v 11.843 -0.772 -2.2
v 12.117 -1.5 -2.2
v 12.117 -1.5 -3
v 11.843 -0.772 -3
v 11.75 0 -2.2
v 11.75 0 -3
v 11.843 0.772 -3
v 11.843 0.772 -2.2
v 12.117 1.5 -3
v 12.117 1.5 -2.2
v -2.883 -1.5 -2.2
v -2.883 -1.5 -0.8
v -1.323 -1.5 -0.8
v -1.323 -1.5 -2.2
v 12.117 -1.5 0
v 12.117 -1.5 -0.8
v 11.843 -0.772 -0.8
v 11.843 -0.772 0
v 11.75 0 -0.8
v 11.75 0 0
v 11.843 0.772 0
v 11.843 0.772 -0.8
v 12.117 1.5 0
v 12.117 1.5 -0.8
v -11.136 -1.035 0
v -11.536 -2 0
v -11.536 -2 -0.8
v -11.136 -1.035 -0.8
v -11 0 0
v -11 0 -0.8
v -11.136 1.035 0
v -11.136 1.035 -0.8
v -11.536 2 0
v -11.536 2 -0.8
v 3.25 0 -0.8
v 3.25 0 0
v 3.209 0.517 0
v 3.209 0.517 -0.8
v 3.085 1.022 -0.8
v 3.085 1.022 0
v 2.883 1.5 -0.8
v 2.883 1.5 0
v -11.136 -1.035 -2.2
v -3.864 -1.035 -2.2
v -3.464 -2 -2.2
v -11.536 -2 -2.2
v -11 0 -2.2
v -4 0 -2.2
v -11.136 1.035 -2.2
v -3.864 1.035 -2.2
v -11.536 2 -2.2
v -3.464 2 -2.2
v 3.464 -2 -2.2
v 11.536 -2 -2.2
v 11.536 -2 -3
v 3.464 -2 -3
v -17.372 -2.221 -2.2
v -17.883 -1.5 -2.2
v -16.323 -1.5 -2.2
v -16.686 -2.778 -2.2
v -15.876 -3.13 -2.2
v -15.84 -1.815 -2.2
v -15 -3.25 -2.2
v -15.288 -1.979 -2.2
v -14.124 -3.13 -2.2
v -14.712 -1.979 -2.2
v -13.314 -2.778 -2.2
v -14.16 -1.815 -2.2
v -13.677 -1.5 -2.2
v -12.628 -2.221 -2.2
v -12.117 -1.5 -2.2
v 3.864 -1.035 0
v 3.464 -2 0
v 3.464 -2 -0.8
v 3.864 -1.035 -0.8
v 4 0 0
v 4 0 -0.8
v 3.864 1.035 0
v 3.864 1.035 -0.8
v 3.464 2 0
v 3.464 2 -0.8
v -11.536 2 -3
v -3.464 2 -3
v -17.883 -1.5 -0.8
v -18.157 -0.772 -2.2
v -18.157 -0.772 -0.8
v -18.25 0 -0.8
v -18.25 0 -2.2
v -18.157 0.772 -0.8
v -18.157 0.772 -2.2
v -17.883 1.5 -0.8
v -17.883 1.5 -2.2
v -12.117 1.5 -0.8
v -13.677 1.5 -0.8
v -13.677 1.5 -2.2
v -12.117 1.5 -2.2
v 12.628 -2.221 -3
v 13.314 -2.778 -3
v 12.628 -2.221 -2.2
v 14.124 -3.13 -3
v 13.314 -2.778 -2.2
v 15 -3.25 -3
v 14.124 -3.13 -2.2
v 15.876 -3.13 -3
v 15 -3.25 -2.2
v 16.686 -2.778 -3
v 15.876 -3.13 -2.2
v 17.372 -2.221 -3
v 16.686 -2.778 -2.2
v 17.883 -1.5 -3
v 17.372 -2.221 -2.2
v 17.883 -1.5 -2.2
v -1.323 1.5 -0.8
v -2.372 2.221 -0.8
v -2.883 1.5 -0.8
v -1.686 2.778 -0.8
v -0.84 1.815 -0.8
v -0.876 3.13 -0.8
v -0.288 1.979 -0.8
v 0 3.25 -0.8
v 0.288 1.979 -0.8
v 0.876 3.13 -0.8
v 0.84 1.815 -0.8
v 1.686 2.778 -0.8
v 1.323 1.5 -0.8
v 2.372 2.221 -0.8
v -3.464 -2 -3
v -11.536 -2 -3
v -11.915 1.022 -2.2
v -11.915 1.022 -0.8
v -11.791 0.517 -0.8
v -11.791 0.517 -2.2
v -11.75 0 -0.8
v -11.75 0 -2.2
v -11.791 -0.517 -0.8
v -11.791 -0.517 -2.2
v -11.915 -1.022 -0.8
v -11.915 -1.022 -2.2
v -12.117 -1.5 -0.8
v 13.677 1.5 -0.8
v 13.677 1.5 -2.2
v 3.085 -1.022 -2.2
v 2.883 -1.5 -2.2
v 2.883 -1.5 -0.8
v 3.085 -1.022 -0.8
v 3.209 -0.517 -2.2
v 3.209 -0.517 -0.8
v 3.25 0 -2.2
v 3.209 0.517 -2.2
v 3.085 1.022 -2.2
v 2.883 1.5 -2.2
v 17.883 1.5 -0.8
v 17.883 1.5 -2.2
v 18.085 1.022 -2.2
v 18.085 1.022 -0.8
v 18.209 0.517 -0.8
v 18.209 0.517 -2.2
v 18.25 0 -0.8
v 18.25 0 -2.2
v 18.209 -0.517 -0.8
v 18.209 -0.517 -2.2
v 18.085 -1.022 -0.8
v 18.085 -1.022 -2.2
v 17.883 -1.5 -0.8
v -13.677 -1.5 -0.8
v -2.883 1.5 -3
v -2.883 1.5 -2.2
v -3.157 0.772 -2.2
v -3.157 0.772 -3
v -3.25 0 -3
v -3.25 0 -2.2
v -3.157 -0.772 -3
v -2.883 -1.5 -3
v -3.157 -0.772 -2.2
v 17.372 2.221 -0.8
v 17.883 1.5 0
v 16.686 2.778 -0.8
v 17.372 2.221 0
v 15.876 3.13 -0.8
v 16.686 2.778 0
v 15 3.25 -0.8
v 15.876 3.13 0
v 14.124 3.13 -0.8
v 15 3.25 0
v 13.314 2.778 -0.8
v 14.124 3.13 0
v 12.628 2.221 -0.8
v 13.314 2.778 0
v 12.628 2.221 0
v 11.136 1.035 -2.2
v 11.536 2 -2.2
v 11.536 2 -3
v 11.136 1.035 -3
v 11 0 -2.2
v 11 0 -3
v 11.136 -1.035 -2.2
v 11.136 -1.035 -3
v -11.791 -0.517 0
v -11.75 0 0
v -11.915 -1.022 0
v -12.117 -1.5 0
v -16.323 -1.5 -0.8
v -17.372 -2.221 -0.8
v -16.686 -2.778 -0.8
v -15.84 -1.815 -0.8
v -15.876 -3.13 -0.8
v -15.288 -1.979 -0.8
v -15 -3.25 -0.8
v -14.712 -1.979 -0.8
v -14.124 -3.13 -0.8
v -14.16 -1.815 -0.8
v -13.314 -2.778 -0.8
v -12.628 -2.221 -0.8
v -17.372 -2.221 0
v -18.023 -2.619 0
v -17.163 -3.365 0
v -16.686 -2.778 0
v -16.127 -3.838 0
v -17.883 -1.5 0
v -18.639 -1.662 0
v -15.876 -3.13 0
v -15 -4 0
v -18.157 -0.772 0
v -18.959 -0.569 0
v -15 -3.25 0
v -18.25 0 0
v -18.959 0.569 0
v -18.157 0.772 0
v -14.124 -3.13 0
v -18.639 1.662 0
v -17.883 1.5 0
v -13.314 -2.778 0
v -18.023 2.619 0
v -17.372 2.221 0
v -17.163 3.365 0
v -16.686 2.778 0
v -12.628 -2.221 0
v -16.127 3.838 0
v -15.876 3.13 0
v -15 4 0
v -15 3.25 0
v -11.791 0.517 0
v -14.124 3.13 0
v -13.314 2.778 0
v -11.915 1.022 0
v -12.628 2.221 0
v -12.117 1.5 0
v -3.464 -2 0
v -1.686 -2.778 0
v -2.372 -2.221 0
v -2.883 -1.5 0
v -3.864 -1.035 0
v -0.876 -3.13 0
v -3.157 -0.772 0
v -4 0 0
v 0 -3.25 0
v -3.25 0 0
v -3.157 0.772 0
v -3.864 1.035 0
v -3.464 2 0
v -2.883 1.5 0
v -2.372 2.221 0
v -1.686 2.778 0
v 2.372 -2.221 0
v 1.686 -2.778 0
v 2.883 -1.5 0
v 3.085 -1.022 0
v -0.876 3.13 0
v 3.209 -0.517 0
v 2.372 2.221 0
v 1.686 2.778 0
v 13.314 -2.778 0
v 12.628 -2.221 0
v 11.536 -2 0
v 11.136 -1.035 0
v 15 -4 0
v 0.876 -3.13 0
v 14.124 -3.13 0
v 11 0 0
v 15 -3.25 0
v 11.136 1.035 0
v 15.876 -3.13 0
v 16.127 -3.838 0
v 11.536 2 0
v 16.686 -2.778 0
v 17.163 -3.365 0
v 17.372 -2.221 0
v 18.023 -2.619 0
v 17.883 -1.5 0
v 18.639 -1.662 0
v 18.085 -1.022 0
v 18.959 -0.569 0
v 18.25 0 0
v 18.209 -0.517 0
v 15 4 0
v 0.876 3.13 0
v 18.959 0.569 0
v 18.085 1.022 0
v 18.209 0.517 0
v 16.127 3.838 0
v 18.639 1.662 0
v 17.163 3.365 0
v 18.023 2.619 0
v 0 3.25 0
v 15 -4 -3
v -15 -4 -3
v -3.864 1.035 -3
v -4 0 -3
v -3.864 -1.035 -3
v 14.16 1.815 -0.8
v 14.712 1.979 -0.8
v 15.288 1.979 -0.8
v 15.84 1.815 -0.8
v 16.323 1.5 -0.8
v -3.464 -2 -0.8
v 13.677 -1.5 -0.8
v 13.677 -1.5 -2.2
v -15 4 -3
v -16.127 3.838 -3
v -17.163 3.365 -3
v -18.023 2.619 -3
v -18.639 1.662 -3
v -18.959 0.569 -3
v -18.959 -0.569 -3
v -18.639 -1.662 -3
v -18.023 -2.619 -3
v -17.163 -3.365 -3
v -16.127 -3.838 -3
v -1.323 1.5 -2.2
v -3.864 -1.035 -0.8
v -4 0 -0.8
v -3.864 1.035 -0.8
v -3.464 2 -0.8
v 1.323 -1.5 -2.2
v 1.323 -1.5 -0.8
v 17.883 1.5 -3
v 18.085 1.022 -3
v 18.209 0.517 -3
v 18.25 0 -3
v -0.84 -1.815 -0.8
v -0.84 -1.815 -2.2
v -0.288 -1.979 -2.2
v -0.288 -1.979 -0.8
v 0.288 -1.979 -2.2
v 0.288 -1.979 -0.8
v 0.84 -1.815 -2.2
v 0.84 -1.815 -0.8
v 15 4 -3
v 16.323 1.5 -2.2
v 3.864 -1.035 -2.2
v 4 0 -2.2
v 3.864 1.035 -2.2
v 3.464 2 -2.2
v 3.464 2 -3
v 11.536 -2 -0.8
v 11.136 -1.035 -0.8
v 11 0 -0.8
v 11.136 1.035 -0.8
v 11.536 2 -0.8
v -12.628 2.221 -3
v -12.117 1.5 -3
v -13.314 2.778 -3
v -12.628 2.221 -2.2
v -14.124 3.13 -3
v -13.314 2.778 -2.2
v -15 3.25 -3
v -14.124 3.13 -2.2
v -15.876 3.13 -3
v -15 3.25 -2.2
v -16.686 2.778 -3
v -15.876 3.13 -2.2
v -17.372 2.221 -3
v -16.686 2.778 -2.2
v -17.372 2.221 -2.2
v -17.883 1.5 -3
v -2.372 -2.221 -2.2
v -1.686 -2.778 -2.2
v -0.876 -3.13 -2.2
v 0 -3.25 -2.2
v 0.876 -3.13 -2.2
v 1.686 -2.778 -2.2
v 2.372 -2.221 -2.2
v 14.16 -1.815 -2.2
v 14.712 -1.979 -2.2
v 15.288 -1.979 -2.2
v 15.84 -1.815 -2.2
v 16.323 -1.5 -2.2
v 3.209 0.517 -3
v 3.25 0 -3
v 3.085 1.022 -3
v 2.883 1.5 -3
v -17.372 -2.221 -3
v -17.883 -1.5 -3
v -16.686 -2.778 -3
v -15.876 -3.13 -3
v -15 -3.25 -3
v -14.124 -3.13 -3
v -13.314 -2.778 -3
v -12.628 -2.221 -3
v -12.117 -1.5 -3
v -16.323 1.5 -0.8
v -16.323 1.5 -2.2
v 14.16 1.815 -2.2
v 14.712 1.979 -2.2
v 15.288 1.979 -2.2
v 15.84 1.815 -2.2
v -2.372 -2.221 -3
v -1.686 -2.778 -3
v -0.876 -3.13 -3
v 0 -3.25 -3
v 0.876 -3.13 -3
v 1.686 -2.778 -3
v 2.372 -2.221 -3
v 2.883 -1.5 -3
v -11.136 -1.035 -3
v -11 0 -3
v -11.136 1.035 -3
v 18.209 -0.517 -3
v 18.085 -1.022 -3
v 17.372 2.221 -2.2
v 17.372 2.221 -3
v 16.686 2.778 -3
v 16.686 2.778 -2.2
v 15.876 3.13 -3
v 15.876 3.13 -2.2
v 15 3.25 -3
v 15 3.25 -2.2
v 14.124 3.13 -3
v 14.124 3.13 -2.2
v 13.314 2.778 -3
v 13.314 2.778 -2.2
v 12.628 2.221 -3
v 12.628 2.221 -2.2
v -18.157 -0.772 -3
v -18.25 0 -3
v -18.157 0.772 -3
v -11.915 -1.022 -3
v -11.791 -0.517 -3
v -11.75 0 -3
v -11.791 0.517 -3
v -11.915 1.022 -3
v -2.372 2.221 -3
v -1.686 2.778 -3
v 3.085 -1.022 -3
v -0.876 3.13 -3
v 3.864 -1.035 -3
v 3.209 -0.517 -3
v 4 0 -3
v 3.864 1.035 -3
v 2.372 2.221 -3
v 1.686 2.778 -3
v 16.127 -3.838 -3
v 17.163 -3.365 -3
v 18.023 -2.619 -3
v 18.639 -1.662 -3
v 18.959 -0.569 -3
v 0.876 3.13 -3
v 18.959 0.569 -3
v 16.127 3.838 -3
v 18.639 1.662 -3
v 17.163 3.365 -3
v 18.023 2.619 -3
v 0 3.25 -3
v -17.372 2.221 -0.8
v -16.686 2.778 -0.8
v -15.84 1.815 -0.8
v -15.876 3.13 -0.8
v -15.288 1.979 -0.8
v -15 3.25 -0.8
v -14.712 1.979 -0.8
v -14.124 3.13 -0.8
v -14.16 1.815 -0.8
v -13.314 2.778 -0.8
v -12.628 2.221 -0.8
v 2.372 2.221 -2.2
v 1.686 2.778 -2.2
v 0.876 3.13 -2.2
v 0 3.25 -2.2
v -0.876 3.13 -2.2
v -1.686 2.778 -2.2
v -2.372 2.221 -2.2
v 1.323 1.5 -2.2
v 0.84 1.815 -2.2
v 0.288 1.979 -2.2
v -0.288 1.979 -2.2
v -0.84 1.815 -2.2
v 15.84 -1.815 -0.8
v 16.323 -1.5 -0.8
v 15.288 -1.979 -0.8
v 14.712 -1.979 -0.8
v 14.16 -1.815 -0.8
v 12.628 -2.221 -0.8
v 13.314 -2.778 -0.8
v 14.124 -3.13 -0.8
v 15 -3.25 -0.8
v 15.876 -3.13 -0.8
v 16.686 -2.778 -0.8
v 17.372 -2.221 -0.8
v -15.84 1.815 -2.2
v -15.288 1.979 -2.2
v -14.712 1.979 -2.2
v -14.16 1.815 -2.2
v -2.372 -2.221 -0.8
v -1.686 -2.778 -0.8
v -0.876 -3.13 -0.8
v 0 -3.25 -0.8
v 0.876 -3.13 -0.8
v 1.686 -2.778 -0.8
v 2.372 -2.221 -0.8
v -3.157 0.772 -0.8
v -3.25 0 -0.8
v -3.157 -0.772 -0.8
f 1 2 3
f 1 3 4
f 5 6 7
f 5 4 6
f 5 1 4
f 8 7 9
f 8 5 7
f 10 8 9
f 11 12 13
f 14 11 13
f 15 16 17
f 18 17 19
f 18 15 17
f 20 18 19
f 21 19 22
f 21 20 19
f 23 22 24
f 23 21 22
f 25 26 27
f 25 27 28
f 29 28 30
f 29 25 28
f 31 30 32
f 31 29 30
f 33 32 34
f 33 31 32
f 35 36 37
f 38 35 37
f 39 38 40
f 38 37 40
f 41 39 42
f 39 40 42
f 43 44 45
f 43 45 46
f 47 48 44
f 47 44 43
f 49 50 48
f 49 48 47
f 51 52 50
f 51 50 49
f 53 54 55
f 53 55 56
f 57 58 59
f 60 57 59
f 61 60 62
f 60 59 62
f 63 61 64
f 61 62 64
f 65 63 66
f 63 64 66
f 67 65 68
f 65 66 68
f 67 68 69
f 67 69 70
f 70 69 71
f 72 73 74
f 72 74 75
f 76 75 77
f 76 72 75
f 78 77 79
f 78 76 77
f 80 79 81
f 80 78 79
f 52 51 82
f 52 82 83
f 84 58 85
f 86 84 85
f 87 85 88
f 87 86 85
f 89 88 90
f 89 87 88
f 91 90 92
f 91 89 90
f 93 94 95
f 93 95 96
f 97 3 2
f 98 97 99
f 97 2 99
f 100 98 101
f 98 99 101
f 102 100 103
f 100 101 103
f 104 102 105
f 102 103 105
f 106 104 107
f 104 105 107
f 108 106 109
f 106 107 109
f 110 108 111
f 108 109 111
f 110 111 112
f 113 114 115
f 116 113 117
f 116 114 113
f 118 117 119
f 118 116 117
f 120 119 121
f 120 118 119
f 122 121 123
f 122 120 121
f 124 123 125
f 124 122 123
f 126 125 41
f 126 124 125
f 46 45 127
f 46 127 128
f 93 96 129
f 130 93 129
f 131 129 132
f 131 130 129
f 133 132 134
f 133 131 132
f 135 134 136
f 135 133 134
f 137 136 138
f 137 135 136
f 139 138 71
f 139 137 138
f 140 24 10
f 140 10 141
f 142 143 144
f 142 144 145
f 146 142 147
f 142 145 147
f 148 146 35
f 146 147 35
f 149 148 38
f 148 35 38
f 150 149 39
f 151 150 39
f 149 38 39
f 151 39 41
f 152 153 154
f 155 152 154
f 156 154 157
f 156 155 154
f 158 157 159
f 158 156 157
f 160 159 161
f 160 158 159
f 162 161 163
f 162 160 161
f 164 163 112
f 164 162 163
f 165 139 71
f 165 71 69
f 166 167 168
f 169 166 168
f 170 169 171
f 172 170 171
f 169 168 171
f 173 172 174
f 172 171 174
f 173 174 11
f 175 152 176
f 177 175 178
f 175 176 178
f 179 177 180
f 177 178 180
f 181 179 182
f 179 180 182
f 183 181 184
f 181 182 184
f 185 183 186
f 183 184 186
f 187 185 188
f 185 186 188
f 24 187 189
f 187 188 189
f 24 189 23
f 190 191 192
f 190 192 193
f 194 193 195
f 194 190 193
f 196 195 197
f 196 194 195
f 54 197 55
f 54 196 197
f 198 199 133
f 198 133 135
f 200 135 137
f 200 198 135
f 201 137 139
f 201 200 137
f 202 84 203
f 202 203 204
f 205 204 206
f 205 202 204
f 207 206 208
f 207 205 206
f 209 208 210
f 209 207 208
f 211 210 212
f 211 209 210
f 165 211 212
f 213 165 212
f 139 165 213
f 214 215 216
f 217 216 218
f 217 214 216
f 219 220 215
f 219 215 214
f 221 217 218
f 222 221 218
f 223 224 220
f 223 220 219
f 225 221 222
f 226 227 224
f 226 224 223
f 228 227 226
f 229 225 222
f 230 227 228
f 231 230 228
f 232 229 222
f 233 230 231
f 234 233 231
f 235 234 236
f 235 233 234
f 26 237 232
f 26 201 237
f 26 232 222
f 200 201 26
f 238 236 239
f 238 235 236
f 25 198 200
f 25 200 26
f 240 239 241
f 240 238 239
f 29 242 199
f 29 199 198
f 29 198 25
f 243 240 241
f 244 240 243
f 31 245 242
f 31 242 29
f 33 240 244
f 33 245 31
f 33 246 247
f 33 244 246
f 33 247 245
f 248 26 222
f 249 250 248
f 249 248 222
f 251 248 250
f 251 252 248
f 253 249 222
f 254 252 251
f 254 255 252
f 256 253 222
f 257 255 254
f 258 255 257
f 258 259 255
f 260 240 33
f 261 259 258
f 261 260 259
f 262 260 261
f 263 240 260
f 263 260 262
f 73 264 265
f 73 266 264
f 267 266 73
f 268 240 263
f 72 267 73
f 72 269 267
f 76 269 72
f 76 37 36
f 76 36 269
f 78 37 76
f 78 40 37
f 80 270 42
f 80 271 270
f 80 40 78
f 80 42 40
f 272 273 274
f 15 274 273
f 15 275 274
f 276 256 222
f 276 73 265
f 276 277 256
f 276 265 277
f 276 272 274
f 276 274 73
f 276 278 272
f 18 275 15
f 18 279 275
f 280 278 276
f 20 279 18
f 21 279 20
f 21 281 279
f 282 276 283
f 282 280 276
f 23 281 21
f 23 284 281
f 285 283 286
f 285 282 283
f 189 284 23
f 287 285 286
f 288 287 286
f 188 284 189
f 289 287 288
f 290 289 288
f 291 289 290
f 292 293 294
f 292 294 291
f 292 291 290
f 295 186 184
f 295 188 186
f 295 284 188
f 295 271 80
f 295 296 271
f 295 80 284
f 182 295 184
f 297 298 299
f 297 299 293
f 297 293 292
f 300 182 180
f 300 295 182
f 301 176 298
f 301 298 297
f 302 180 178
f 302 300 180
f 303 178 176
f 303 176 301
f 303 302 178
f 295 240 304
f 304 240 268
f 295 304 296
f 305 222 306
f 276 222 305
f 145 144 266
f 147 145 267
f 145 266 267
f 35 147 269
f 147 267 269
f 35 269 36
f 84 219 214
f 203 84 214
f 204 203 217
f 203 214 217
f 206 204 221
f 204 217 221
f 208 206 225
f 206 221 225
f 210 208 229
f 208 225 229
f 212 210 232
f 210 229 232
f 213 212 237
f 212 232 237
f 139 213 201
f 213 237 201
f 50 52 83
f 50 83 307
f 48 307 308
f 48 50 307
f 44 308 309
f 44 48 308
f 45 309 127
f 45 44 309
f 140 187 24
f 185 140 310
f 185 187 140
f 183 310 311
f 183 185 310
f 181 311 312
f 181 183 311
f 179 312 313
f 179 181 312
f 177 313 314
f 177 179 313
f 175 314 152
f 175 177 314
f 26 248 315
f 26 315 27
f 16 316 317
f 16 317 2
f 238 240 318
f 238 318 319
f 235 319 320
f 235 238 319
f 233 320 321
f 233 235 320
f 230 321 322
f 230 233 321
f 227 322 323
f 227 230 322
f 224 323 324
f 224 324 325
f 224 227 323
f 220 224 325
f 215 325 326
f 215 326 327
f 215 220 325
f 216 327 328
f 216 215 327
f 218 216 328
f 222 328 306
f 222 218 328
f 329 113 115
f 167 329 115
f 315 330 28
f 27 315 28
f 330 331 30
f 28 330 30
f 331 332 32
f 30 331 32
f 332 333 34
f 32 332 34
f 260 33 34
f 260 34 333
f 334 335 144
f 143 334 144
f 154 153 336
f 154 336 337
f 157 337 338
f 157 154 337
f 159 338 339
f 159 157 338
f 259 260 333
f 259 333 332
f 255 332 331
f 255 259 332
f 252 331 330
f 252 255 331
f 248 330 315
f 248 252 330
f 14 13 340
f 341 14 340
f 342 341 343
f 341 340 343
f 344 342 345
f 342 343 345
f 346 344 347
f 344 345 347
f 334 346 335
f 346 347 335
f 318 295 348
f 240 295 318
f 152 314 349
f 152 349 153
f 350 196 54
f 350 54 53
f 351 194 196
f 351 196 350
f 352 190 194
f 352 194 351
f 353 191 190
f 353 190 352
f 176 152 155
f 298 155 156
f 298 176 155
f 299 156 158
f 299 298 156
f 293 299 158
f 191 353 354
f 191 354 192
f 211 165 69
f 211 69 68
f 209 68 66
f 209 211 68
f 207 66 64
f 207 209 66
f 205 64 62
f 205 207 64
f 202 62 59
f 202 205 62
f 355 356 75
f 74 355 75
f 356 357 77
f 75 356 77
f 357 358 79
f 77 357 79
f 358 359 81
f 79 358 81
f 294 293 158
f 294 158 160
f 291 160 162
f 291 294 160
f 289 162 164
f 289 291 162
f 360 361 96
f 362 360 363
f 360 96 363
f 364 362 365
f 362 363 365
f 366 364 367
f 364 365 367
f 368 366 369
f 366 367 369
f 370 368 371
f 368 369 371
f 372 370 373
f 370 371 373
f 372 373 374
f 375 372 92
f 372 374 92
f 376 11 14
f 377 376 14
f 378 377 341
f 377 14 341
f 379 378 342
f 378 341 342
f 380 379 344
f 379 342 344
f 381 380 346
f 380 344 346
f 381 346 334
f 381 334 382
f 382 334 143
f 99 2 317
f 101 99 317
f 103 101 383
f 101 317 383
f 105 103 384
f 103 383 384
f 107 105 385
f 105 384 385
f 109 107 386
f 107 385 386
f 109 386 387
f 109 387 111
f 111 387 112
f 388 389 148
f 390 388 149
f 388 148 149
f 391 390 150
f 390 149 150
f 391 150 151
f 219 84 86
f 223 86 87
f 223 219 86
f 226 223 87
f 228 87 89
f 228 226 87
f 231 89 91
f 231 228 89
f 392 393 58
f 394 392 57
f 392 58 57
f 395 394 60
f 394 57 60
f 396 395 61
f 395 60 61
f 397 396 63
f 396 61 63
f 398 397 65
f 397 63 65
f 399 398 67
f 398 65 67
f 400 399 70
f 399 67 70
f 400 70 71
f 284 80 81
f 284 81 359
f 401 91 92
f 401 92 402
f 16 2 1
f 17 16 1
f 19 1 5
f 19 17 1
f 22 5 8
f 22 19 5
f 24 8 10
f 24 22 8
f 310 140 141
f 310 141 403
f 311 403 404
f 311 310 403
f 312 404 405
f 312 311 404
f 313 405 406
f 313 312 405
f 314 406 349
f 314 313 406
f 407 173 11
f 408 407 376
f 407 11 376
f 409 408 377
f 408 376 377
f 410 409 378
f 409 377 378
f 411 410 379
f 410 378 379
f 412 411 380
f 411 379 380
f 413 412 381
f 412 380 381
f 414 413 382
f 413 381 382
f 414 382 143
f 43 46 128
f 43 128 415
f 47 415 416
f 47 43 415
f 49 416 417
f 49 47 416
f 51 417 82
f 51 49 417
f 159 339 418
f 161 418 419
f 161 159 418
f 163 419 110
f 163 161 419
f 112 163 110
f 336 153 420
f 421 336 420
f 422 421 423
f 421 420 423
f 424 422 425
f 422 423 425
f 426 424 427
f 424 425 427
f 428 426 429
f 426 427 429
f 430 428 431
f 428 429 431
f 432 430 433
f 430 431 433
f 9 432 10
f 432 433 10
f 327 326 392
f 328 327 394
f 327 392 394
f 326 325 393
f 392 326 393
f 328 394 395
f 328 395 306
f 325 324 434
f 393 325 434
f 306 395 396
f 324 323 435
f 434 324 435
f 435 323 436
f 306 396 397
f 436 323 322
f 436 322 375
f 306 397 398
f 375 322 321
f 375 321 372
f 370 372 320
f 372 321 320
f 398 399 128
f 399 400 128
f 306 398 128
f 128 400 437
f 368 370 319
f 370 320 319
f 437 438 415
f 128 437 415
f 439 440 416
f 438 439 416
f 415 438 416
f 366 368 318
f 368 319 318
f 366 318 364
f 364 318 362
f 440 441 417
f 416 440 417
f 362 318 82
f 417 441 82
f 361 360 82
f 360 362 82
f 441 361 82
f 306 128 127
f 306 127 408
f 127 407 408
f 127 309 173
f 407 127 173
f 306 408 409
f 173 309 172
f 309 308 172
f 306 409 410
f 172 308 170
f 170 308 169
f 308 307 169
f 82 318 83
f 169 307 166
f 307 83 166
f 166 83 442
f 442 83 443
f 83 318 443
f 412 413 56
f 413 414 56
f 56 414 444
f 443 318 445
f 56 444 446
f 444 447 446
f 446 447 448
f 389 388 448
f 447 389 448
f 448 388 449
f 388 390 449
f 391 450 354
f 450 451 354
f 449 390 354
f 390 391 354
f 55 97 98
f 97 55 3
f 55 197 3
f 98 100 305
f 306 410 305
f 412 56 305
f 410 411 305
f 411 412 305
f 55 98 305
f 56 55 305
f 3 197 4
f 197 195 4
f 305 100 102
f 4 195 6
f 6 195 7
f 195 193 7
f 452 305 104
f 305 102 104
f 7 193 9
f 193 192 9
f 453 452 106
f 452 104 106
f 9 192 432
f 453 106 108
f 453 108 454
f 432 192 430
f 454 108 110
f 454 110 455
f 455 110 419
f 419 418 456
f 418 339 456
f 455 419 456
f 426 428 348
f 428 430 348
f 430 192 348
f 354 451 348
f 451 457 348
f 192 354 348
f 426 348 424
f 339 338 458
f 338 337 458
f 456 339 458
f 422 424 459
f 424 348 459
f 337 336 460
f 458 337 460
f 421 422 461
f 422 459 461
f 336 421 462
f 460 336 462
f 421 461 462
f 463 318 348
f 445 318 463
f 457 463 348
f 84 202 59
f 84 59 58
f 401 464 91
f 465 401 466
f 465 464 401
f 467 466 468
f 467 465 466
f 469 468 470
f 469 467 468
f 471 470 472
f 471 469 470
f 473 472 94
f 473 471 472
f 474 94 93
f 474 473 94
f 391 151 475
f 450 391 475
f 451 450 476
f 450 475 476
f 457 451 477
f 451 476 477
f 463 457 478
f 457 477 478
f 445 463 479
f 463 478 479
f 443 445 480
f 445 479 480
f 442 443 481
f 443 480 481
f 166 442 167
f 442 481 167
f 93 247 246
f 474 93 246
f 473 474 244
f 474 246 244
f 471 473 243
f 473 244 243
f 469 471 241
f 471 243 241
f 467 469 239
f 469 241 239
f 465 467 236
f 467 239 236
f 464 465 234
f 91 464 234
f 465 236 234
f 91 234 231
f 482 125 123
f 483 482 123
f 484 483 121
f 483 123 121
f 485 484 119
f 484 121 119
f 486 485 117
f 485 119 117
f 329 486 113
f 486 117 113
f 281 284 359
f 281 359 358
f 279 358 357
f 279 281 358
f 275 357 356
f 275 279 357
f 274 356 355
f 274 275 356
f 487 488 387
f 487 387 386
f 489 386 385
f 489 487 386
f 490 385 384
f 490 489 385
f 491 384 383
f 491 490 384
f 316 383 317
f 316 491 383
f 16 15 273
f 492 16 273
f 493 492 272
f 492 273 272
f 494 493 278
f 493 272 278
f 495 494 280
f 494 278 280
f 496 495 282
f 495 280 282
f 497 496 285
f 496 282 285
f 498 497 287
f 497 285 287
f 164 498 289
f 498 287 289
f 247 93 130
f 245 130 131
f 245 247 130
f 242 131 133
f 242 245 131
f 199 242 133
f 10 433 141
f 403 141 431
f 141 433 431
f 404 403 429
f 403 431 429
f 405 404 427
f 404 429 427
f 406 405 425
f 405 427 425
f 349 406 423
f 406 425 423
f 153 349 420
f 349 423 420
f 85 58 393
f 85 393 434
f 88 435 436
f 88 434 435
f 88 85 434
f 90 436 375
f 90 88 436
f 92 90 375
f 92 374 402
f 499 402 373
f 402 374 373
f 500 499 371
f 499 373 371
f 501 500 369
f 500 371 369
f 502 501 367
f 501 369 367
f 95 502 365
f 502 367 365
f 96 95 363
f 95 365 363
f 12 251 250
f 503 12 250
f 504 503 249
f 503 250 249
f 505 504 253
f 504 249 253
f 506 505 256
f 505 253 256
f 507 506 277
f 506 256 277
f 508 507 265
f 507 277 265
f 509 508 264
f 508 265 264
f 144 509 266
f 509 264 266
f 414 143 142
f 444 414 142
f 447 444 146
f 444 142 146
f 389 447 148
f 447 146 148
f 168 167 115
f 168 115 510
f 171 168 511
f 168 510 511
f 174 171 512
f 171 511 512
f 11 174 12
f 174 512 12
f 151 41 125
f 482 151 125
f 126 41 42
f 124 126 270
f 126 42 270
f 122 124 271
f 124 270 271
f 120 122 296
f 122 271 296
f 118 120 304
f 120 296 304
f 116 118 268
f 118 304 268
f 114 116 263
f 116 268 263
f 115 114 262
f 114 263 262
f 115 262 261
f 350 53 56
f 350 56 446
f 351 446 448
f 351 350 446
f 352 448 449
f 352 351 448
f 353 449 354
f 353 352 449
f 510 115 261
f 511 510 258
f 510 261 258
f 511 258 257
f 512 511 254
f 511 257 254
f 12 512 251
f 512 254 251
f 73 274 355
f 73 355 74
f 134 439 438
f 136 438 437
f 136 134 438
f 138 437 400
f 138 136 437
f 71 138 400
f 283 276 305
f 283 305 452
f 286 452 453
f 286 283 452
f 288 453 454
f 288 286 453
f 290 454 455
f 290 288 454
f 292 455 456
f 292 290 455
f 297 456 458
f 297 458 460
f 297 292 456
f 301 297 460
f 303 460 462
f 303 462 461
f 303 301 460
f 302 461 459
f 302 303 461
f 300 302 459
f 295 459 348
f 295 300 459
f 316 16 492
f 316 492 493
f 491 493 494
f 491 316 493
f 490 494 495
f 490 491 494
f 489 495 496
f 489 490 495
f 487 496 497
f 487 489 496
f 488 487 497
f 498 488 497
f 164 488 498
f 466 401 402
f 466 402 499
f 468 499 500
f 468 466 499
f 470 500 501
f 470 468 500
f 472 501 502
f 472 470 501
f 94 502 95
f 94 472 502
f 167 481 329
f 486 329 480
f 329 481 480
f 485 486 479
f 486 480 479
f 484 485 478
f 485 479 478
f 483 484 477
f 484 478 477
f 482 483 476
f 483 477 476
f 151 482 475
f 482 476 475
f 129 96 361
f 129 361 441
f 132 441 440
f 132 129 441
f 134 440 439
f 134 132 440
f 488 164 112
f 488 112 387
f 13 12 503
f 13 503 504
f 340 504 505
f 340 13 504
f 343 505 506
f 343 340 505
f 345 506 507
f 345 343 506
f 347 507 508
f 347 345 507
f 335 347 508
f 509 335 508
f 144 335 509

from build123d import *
from build123d.topology import SkipClean

# Parameters (mm, degrees)
EXTRUDE_1_DEPTH     = 3
CUT_EXTRUDE_1_REACH = 21.647
SKETCH_3_R          = 3.25
CUT_EXTRUDE_2_DEPTH = 0.8
CUT_EXTRUDE_START   = -2.2
SKETCH_3_2_R        = 3.25
CUT_EXTRUDE_3_DEPTH = 0.8
CUT_EXTRUDE_4_DEPTH = 0.8
CUT_EXTRUDE_5_DEPTH = 0.8


with BuildPart() as part:
    # 草图1 → 凸台-拉伸1 (new body)
    with BuildSketch(Plane.XY):
        with BuildLine():
            Line((-15, -4), (15, -4))
            ThreePointArc((15, -4), (19, 0), (15, 4))
            Line((15, 4), (-15, 4))
            ThreePointArc((-15, 4), (-19, 0), (-15, -4))
        make_face()
    extrude(amount=-EXTRUDE_1_DEPTH)

    # 草图2 → 切除-拉伸1 (cut, up to next)
    with BuildSketch(Plane.XY, mode=Mode.PRIVATE) as cut_extrude_1_sk1:
        with BuildLine():
            Line((-2.883140649, -1.5), (-1.322875656, -1.5))
            ThreePointArc((-1.322875656, -1.5), (0, -2), (1.322875656, -1.5))
            Line((1.322875656, -1.5), (2.883140649, -1.5))
            ThreePointArc((2.883140649, -1.5), (3.25, 0), (2.883140649, 1.5))
            Line((2.883140649, 1.5), (1.322875656, 1.5))
            ThreePointArc((1.322875656, 1.5), (0, 2), (-1.322875656, 1.5))
            Line((-1.322875656, 1.5), (-2.883140649, 1.5))
            ThreePointArc((-2.883140649, 1.5), (-3.25, 0), (-2.883140649, -1.5))
        make_face()
    cut_extrude_1_tool1 = extrude(cut_extrude_1_sk1.sketch, amount=-CUT_EXTRUDE_1_REACH, mode=Mode.PRIVATE) & part.part
    # 草图2 → 切除-拉伸1 (cut, up to next)
    with BuildSketch(Plane.XY, mode=Mode.PRIVATE) as cut_extrude_1_sk2:
        with BuildLine():
            Line((-17.883140649, 1.5), (-16.322875656, 1.5))
            ThreePointArc((-16.322875656, 1.5), (-15, 2), (-13.677124344, 1.5))
            Line((-13.677124344, 1.5), (-12.116859351, 1.5))
            ThreePointArc((-12.116859351, 1.5), (-11.75, 0), (-12.116859351, -1.5))
            Line((-12.116859351, -1.5), (-13.677124344, -1.5))
            ThreePointArc((-13.677124344, -1.5), (-15, -2), (-16.322875656, -1.5))
            Line((-16.322875656, -1.5), (-17.883140649, -1.5))
            ThreePointArc((-17.883140649, -1.5), (-18.25, 0), (-17.883140649, 1.5))
        make_face()
    cut_extrude_1_tool2 = extrude(cut_extrude_1_sk2.sketch, amount=-CUT_EXTRUDE_1_REACH, mode=Mode.PRIVATE) & part.part
    # 草图2 → 切除-拉伸1 (cut, up to next)
    with BuildSketch(Plane.XY, mode=Mode.PRIVATE) as cut_extrude_1_sk3:
        with BuildLine():
            Line((12.116859351, 1.5), (13.677124344, 1.5))
            ThreePointArc((13.677124344, 1.5), (15, 2), (16.322875656, 1.5))
            Line((16.322875656, 1.5), (17.883140649, 1.5))
            ThreePointArc((17.883140649, 1.5), (18.25, 0), (17.883140649, -1.5))
            Line((17.883140649, -1.5), (16.322875656, -1.5))
            ThreePointArc((16.322875656, -1.5), (15, -2), (13.677124344, -1.5))
            Line((13.677124344, -1.5), (12.116859351, -1.5))
            ThreePointArc((12.116859351, -1.5), (11.75, 0), (12.116859351, 1.5))
        make_face()
    cut_extrude_1_tool3 = extrude(cut_extrude_1_sk3.sketch, amount=-CUT_EXTRUDE_1_REACH, mode=Mode.PRIVATE) & part.part
    add(cut_extrude_1_tool1.solids().sort_by_distance((0, 0, 0))[0], mode=Mode.SUBTRACT)
    add(cut_extrude_1_tool2.solids().sort_by_distance((-15, 0, 0))[0], mode=Mode.SUBTRACT)
    add(cut_extrude_1_tool3.solids().sort_by_distance((15, 0, 0))[0], mode=Mode.SUBTRACT)

    # 草图3 → 切除-拉伸2 (cut)
    with SkipClean():  # the faces are left unmerged after this step: merging them gives an invalid solid
        with BuildSketch(Plane.XY):
            with Locations((-15, 0)):
                Circle(SKETCH_3_R)
            Circle(SKETCH_3_R)
            with Locations((15, 0)):
                Circle(SKETCH_3_R)
        extrude(amount=-CUT_EXTRUDE_2_DEPTH, mode=Mode.SUBTRACT)

    # 草图3<2> → 切除-拉伸3 (cut)
    with SkipClean():  # the faces are left unmerged after this step: merging them gives an invalid solid
        with BuildSketch(Plane.XY.offset(CUT_EXTRUDE_START)):
            with Locations((-15, 0)):
                Circle(SKETCH_3_2_R)
            Circle(SKETCH_3_2_R)
            with Locations((15, 0)):
                Circle(SKETCH_3_2_R)
        extrude(amount=-CUT_EXTRUDE_3_DEPTH, mode=Mode.SUBTRACT)

    # 草图4 → 切除-拉伸4 (cut)
    with SkipClean():  # the faces are left unmerged after this step: merging them gives an invalid solid
        with BuildSketch(Plane.XY):
            with BuildLine():
                Line((-11.535898385, 2), (-3.464101615, 2))
                ThreePointArc((-3.464101615, 2), (-4, 0), (-3.464101615, -2))
                Line((-3.464101615, -2), (-11.535898385, -2))
                ThreePointArc((-11.535898385, -2), (-11, 0), (-11.535898385, 2))
            make_face()
            with BuildLine():
                Line((3.464101615, 2), (11.535898385, 2))
                ThreePointArc((11.535898385, 2), (11, 0), (11.535898385, -2))
                Line((11.535898385, -2), (3.464101615, -2))
                ThreePointArc((3.464101615, -2), (4, 0), (3.464101615, 2))
            make_face()
        extrude(amount=-CUT_EXTRUDE_4_DEPTH, mode=Mode.SUBTRACT)

    # 草图4<2> → 切除-拉伸5 (cut)
    with SkipClean():  # the faces are left unmerged after this step: merging them gives an invalid solid
        with BuildSketch(Plane.XY.offset(CUT_EXTRUDE_START)):
            with BuildLine():
                Line((-11.535898385, 2), (-3.464101615, 2))
                ThreePointArc((-3.464101615, 2), (-4, 0), (-3.464101615, -2))
                Line((-3.464101615, -2), (-11.535898385, -2))
                ThreePointArc((-11.535898385, -2), (-11, 0), (-11.535898385, 2))
            make_face()
            with BuildLine():
                Line((3.464101615, 2), (11.535898385, 2))
                ThreePointArc((11.535898385, 2), (11, 0), (11.535898385, -2))
                Line((11.535898385, -2), (3.464101615, -2))
                ThreePointArc((3.464101615, -2), (4, 0), (3.464101615, 2))
            make_face()
        extrude(amount=-CUT_EXTRUDE_5_DEPTH, mode=Mode.SUBTRACT)


solid = part.part
